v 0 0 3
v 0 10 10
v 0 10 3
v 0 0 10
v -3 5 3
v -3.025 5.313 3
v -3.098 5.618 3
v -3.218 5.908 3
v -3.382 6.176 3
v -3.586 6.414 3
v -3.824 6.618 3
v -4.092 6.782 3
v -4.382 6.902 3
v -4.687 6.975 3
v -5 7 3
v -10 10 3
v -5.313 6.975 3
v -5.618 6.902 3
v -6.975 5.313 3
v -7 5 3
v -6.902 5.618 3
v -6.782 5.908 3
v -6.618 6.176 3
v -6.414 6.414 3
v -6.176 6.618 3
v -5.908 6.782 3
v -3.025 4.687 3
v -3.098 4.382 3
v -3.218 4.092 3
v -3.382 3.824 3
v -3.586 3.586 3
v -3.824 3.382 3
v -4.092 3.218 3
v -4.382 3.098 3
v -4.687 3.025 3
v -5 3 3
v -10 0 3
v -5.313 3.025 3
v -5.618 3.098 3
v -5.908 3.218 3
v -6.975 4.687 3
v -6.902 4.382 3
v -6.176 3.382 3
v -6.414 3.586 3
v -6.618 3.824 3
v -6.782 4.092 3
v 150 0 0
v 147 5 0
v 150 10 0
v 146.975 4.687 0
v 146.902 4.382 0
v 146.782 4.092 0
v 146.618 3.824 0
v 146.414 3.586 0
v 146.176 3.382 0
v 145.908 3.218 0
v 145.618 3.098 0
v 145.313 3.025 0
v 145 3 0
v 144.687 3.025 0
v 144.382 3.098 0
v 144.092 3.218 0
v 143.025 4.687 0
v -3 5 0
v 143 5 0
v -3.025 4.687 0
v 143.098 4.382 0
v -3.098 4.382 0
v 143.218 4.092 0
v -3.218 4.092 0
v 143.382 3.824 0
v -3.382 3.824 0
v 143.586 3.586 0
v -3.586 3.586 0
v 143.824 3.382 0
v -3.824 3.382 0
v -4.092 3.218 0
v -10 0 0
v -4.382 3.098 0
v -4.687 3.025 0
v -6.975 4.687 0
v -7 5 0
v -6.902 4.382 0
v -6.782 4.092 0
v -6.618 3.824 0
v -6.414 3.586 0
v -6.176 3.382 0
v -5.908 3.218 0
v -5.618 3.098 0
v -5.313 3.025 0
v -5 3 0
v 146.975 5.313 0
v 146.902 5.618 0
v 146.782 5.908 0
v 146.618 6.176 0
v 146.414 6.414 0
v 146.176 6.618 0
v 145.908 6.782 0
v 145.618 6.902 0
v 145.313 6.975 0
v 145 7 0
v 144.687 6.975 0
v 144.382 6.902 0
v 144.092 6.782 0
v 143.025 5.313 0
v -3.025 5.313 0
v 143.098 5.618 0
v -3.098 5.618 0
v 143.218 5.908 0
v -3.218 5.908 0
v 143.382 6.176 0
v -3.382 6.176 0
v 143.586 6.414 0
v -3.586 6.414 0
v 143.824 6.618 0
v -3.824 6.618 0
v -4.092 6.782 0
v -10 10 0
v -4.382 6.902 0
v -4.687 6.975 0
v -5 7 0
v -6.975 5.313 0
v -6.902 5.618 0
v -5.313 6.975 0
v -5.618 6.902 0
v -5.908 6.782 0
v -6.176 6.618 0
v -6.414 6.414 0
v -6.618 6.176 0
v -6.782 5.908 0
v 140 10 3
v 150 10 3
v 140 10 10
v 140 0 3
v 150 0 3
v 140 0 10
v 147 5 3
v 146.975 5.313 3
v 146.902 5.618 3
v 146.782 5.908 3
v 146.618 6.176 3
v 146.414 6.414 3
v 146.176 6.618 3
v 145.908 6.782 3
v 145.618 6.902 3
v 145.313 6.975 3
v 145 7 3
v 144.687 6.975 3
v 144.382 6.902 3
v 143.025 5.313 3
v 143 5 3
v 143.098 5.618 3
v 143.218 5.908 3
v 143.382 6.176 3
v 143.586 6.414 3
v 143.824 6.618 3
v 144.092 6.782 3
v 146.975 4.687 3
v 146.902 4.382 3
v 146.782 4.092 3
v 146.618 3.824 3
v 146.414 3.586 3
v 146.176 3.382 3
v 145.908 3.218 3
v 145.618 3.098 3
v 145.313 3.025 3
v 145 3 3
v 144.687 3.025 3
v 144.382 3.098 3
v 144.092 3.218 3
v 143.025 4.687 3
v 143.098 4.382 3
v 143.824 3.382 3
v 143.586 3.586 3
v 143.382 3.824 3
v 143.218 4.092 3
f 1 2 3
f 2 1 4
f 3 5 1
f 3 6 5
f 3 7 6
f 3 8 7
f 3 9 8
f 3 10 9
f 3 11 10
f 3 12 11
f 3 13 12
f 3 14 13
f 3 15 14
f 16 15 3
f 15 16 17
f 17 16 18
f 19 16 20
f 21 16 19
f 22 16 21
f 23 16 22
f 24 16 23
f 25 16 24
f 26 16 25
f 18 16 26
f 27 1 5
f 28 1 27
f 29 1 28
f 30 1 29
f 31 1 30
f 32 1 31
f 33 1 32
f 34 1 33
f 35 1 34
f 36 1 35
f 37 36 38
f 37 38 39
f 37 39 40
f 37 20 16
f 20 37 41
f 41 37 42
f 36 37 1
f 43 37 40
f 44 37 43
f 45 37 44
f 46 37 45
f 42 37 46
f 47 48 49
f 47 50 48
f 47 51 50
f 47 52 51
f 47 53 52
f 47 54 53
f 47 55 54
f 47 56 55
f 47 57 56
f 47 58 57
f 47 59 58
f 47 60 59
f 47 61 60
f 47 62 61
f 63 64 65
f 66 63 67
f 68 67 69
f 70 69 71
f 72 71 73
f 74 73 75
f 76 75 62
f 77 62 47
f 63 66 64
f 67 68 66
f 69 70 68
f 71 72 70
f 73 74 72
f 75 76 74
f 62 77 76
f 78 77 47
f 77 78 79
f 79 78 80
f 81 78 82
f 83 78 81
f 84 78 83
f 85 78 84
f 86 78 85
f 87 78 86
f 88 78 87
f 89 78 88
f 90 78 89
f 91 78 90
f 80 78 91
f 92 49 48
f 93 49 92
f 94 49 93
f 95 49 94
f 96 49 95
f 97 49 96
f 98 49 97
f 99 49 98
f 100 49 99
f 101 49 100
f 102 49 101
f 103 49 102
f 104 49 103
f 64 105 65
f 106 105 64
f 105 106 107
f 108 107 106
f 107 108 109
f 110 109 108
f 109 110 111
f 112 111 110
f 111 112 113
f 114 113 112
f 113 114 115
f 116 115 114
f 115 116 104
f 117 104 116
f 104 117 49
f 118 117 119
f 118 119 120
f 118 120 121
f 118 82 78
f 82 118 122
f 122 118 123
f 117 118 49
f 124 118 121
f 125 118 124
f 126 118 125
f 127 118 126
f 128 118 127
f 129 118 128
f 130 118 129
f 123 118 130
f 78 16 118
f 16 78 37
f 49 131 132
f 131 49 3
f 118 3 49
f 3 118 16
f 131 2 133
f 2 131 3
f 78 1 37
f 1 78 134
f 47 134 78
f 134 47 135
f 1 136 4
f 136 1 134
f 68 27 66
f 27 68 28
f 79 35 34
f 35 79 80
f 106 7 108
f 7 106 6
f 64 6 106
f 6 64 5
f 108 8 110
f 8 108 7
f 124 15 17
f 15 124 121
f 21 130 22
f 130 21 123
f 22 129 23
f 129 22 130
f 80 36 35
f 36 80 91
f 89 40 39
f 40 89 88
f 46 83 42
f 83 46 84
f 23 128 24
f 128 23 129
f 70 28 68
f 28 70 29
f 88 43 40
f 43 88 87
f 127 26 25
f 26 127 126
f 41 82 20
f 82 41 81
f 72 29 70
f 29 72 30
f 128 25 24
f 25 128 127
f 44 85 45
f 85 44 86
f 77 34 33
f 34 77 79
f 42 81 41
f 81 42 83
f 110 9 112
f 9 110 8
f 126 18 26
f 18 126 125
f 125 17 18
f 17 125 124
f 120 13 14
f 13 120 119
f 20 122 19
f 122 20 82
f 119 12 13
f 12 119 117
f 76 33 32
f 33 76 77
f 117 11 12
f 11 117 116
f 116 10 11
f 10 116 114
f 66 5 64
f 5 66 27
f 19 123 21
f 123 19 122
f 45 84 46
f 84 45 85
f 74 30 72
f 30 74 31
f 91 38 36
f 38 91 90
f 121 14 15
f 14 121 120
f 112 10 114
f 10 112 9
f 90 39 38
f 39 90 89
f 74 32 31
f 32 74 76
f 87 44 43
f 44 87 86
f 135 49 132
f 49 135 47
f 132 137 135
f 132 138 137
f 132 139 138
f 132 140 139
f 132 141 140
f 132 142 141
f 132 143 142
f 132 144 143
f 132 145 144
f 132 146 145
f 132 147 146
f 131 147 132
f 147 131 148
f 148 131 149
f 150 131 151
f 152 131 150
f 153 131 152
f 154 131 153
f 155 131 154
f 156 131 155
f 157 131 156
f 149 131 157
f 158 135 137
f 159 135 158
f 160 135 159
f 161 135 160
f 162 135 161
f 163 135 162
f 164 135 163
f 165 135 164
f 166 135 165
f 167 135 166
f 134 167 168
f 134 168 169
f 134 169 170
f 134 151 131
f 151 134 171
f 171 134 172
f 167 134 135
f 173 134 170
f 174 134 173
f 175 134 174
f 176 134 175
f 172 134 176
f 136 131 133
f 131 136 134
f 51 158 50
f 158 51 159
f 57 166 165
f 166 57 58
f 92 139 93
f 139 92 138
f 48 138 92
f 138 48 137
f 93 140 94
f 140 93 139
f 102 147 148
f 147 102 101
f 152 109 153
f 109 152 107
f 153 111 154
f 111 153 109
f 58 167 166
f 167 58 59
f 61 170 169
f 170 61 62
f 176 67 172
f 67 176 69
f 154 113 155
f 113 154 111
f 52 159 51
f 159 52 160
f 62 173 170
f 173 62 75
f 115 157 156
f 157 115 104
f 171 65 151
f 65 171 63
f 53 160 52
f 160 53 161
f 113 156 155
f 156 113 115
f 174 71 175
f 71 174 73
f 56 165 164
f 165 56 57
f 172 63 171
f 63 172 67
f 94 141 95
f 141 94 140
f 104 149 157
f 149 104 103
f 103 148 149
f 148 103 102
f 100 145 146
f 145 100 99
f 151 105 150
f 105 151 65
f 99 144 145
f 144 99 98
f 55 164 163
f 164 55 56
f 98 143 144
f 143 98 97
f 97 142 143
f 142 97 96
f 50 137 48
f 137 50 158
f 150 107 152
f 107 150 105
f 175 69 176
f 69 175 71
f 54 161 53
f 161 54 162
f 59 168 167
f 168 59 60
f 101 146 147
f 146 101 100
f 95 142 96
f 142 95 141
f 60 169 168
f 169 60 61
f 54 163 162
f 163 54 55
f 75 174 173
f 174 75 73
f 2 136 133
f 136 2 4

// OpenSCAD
/**
 * Martin Egli
 * 2021-09-15
 */
res = 40;

cube([140, 10, 10]);

translate([-10, 0, 0])
difference() {
    cube([10, 10, 3]);
    translate([5, 5, -1])
    cylinder(d = 4, h = 5, $fn = res);
}
    

translate([140, 0, 0])
difference() {
    cube([10, 10, 3]);
    translate([5, 5, -1])
    cylinder(d = 4, h = 5, $fn = res);
}
